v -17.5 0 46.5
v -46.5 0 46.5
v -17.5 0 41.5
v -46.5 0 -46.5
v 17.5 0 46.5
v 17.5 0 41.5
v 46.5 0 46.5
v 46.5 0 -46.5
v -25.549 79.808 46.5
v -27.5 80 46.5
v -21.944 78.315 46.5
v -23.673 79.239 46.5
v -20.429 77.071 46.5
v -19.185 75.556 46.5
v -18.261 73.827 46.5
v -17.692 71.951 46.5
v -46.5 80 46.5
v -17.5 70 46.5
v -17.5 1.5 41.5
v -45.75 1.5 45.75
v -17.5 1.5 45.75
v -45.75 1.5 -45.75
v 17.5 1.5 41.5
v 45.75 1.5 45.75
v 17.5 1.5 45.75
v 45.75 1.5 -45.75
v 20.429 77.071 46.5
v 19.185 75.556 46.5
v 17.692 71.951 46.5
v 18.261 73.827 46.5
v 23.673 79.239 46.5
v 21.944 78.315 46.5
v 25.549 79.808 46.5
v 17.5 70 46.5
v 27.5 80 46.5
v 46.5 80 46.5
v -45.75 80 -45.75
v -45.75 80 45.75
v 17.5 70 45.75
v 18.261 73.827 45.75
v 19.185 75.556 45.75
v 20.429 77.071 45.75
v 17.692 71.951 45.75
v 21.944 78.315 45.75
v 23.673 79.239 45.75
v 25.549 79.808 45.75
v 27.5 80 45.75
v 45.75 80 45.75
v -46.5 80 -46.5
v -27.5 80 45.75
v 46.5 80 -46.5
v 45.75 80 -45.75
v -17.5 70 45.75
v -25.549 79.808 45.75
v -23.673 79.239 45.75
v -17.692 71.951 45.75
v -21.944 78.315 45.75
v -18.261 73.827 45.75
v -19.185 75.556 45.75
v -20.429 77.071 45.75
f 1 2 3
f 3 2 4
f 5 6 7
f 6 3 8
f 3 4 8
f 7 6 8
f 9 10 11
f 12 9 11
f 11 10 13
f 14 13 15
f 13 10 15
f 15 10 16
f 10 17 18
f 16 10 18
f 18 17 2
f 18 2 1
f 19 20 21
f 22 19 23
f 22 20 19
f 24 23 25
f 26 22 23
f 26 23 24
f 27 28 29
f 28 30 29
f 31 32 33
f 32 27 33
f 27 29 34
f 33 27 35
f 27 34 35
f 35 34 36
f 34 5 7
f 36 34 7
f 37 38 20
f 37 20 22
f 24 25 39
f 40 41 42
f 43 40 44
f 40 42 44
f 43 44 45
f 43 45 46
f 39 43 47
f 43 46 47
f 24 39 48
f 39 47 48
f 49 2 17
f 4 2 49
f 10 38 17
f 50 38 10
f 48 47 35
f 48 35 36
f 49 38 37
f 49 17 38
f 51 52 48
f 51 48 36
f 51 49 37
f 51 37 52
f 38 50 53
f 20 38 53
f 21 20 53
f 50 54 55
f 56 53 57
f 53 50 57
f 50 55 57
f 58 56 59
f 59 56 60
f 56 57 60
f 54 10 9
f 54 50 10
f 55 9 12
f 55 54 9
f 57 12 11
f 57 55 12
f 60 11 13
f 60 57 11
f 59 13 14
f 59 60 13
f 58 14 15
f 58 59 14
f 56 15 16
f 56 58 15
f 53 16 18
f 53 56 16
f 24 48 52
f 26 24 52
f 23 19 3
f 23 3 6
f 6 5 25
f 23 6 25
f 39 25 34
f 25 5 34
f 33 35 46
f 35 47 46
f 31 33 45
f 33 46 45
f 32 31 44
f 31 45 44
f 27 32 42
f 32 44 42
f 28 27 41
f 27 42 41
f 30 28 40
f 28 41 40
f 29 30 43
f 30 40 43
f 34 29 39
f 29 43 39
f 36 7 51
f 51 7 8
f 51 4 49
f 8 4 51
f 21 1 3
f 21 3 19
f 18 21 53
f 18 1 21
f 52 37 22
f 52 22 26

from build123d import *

# Parameters (mm, degrees)
SKETCH2_W           = 93
SKETCH2_H           = 93
BOSS_EXTRUDE2_DEPTH = 80
SKETCH3_W           = 91.5
SKETCH3_H           = 91.5
CUT_EXTRUDE1_DEPTH  = 78.5
SKETCH6_W           = 35
SKETCH6_H           = 80
CUT_EXTRUDE2_DEPTH  = 5
FILLET1_R           = 10
FILLET2_R           = 10


with BuildPart() as part:
    # Sketch2 → Boss-Extrude2 (new body)
    with BuildSketch(Plane(origin=(0, 0, 0), x_dir=(1, 0, 0), z_dir=(0, 1, 0))):
        Rectangle(SKETCH2_W, SKETCH2_H)
    extrude(amount=BOSS_EXTRUDE2_DEPTH)

    # Sketch3 → Cut-Extrude1 (cut)
    with BuildSketch(Plane(origin=(0, 80, 0), x_dir=(1, 0, 0), z_dir=(0, 1, 0))):
        Rectangle(SKETCH3_W, SKETCH3_H)
    extrude(amount=-CUT_EXTRUDE1_DEPTH, mode=Mode.SUBTRACT)

    # Sketch6 → Cut-Extrude2 (cut)
    with BuildSketch(Plane.XY.offset(46.5)):
        with Locations((0, 40)):
            Rectangle(SKETCH6_W, SKETCH6_H)
    extrude(amount=-CUT_EXTRUDE2_DEPTH, mode=Mode.SUBTRACT)

    # Fillet1
    fillet1_edges = [part.edges().sort_by_distance(p)[0] for p in [
        (-17.5, 80, 46.125),
    ]]
    fillet(fillet1_edges, radius=FILLET1_R)

    # Fillet2
    fillet2_edges = [part.edges().sort_by_distance(p)[0] for p in [
        (17.5, 80, 46.125),
    ]]
    fillet(fillet2_edges, radius=FILLET2_R)


solid = part.part
